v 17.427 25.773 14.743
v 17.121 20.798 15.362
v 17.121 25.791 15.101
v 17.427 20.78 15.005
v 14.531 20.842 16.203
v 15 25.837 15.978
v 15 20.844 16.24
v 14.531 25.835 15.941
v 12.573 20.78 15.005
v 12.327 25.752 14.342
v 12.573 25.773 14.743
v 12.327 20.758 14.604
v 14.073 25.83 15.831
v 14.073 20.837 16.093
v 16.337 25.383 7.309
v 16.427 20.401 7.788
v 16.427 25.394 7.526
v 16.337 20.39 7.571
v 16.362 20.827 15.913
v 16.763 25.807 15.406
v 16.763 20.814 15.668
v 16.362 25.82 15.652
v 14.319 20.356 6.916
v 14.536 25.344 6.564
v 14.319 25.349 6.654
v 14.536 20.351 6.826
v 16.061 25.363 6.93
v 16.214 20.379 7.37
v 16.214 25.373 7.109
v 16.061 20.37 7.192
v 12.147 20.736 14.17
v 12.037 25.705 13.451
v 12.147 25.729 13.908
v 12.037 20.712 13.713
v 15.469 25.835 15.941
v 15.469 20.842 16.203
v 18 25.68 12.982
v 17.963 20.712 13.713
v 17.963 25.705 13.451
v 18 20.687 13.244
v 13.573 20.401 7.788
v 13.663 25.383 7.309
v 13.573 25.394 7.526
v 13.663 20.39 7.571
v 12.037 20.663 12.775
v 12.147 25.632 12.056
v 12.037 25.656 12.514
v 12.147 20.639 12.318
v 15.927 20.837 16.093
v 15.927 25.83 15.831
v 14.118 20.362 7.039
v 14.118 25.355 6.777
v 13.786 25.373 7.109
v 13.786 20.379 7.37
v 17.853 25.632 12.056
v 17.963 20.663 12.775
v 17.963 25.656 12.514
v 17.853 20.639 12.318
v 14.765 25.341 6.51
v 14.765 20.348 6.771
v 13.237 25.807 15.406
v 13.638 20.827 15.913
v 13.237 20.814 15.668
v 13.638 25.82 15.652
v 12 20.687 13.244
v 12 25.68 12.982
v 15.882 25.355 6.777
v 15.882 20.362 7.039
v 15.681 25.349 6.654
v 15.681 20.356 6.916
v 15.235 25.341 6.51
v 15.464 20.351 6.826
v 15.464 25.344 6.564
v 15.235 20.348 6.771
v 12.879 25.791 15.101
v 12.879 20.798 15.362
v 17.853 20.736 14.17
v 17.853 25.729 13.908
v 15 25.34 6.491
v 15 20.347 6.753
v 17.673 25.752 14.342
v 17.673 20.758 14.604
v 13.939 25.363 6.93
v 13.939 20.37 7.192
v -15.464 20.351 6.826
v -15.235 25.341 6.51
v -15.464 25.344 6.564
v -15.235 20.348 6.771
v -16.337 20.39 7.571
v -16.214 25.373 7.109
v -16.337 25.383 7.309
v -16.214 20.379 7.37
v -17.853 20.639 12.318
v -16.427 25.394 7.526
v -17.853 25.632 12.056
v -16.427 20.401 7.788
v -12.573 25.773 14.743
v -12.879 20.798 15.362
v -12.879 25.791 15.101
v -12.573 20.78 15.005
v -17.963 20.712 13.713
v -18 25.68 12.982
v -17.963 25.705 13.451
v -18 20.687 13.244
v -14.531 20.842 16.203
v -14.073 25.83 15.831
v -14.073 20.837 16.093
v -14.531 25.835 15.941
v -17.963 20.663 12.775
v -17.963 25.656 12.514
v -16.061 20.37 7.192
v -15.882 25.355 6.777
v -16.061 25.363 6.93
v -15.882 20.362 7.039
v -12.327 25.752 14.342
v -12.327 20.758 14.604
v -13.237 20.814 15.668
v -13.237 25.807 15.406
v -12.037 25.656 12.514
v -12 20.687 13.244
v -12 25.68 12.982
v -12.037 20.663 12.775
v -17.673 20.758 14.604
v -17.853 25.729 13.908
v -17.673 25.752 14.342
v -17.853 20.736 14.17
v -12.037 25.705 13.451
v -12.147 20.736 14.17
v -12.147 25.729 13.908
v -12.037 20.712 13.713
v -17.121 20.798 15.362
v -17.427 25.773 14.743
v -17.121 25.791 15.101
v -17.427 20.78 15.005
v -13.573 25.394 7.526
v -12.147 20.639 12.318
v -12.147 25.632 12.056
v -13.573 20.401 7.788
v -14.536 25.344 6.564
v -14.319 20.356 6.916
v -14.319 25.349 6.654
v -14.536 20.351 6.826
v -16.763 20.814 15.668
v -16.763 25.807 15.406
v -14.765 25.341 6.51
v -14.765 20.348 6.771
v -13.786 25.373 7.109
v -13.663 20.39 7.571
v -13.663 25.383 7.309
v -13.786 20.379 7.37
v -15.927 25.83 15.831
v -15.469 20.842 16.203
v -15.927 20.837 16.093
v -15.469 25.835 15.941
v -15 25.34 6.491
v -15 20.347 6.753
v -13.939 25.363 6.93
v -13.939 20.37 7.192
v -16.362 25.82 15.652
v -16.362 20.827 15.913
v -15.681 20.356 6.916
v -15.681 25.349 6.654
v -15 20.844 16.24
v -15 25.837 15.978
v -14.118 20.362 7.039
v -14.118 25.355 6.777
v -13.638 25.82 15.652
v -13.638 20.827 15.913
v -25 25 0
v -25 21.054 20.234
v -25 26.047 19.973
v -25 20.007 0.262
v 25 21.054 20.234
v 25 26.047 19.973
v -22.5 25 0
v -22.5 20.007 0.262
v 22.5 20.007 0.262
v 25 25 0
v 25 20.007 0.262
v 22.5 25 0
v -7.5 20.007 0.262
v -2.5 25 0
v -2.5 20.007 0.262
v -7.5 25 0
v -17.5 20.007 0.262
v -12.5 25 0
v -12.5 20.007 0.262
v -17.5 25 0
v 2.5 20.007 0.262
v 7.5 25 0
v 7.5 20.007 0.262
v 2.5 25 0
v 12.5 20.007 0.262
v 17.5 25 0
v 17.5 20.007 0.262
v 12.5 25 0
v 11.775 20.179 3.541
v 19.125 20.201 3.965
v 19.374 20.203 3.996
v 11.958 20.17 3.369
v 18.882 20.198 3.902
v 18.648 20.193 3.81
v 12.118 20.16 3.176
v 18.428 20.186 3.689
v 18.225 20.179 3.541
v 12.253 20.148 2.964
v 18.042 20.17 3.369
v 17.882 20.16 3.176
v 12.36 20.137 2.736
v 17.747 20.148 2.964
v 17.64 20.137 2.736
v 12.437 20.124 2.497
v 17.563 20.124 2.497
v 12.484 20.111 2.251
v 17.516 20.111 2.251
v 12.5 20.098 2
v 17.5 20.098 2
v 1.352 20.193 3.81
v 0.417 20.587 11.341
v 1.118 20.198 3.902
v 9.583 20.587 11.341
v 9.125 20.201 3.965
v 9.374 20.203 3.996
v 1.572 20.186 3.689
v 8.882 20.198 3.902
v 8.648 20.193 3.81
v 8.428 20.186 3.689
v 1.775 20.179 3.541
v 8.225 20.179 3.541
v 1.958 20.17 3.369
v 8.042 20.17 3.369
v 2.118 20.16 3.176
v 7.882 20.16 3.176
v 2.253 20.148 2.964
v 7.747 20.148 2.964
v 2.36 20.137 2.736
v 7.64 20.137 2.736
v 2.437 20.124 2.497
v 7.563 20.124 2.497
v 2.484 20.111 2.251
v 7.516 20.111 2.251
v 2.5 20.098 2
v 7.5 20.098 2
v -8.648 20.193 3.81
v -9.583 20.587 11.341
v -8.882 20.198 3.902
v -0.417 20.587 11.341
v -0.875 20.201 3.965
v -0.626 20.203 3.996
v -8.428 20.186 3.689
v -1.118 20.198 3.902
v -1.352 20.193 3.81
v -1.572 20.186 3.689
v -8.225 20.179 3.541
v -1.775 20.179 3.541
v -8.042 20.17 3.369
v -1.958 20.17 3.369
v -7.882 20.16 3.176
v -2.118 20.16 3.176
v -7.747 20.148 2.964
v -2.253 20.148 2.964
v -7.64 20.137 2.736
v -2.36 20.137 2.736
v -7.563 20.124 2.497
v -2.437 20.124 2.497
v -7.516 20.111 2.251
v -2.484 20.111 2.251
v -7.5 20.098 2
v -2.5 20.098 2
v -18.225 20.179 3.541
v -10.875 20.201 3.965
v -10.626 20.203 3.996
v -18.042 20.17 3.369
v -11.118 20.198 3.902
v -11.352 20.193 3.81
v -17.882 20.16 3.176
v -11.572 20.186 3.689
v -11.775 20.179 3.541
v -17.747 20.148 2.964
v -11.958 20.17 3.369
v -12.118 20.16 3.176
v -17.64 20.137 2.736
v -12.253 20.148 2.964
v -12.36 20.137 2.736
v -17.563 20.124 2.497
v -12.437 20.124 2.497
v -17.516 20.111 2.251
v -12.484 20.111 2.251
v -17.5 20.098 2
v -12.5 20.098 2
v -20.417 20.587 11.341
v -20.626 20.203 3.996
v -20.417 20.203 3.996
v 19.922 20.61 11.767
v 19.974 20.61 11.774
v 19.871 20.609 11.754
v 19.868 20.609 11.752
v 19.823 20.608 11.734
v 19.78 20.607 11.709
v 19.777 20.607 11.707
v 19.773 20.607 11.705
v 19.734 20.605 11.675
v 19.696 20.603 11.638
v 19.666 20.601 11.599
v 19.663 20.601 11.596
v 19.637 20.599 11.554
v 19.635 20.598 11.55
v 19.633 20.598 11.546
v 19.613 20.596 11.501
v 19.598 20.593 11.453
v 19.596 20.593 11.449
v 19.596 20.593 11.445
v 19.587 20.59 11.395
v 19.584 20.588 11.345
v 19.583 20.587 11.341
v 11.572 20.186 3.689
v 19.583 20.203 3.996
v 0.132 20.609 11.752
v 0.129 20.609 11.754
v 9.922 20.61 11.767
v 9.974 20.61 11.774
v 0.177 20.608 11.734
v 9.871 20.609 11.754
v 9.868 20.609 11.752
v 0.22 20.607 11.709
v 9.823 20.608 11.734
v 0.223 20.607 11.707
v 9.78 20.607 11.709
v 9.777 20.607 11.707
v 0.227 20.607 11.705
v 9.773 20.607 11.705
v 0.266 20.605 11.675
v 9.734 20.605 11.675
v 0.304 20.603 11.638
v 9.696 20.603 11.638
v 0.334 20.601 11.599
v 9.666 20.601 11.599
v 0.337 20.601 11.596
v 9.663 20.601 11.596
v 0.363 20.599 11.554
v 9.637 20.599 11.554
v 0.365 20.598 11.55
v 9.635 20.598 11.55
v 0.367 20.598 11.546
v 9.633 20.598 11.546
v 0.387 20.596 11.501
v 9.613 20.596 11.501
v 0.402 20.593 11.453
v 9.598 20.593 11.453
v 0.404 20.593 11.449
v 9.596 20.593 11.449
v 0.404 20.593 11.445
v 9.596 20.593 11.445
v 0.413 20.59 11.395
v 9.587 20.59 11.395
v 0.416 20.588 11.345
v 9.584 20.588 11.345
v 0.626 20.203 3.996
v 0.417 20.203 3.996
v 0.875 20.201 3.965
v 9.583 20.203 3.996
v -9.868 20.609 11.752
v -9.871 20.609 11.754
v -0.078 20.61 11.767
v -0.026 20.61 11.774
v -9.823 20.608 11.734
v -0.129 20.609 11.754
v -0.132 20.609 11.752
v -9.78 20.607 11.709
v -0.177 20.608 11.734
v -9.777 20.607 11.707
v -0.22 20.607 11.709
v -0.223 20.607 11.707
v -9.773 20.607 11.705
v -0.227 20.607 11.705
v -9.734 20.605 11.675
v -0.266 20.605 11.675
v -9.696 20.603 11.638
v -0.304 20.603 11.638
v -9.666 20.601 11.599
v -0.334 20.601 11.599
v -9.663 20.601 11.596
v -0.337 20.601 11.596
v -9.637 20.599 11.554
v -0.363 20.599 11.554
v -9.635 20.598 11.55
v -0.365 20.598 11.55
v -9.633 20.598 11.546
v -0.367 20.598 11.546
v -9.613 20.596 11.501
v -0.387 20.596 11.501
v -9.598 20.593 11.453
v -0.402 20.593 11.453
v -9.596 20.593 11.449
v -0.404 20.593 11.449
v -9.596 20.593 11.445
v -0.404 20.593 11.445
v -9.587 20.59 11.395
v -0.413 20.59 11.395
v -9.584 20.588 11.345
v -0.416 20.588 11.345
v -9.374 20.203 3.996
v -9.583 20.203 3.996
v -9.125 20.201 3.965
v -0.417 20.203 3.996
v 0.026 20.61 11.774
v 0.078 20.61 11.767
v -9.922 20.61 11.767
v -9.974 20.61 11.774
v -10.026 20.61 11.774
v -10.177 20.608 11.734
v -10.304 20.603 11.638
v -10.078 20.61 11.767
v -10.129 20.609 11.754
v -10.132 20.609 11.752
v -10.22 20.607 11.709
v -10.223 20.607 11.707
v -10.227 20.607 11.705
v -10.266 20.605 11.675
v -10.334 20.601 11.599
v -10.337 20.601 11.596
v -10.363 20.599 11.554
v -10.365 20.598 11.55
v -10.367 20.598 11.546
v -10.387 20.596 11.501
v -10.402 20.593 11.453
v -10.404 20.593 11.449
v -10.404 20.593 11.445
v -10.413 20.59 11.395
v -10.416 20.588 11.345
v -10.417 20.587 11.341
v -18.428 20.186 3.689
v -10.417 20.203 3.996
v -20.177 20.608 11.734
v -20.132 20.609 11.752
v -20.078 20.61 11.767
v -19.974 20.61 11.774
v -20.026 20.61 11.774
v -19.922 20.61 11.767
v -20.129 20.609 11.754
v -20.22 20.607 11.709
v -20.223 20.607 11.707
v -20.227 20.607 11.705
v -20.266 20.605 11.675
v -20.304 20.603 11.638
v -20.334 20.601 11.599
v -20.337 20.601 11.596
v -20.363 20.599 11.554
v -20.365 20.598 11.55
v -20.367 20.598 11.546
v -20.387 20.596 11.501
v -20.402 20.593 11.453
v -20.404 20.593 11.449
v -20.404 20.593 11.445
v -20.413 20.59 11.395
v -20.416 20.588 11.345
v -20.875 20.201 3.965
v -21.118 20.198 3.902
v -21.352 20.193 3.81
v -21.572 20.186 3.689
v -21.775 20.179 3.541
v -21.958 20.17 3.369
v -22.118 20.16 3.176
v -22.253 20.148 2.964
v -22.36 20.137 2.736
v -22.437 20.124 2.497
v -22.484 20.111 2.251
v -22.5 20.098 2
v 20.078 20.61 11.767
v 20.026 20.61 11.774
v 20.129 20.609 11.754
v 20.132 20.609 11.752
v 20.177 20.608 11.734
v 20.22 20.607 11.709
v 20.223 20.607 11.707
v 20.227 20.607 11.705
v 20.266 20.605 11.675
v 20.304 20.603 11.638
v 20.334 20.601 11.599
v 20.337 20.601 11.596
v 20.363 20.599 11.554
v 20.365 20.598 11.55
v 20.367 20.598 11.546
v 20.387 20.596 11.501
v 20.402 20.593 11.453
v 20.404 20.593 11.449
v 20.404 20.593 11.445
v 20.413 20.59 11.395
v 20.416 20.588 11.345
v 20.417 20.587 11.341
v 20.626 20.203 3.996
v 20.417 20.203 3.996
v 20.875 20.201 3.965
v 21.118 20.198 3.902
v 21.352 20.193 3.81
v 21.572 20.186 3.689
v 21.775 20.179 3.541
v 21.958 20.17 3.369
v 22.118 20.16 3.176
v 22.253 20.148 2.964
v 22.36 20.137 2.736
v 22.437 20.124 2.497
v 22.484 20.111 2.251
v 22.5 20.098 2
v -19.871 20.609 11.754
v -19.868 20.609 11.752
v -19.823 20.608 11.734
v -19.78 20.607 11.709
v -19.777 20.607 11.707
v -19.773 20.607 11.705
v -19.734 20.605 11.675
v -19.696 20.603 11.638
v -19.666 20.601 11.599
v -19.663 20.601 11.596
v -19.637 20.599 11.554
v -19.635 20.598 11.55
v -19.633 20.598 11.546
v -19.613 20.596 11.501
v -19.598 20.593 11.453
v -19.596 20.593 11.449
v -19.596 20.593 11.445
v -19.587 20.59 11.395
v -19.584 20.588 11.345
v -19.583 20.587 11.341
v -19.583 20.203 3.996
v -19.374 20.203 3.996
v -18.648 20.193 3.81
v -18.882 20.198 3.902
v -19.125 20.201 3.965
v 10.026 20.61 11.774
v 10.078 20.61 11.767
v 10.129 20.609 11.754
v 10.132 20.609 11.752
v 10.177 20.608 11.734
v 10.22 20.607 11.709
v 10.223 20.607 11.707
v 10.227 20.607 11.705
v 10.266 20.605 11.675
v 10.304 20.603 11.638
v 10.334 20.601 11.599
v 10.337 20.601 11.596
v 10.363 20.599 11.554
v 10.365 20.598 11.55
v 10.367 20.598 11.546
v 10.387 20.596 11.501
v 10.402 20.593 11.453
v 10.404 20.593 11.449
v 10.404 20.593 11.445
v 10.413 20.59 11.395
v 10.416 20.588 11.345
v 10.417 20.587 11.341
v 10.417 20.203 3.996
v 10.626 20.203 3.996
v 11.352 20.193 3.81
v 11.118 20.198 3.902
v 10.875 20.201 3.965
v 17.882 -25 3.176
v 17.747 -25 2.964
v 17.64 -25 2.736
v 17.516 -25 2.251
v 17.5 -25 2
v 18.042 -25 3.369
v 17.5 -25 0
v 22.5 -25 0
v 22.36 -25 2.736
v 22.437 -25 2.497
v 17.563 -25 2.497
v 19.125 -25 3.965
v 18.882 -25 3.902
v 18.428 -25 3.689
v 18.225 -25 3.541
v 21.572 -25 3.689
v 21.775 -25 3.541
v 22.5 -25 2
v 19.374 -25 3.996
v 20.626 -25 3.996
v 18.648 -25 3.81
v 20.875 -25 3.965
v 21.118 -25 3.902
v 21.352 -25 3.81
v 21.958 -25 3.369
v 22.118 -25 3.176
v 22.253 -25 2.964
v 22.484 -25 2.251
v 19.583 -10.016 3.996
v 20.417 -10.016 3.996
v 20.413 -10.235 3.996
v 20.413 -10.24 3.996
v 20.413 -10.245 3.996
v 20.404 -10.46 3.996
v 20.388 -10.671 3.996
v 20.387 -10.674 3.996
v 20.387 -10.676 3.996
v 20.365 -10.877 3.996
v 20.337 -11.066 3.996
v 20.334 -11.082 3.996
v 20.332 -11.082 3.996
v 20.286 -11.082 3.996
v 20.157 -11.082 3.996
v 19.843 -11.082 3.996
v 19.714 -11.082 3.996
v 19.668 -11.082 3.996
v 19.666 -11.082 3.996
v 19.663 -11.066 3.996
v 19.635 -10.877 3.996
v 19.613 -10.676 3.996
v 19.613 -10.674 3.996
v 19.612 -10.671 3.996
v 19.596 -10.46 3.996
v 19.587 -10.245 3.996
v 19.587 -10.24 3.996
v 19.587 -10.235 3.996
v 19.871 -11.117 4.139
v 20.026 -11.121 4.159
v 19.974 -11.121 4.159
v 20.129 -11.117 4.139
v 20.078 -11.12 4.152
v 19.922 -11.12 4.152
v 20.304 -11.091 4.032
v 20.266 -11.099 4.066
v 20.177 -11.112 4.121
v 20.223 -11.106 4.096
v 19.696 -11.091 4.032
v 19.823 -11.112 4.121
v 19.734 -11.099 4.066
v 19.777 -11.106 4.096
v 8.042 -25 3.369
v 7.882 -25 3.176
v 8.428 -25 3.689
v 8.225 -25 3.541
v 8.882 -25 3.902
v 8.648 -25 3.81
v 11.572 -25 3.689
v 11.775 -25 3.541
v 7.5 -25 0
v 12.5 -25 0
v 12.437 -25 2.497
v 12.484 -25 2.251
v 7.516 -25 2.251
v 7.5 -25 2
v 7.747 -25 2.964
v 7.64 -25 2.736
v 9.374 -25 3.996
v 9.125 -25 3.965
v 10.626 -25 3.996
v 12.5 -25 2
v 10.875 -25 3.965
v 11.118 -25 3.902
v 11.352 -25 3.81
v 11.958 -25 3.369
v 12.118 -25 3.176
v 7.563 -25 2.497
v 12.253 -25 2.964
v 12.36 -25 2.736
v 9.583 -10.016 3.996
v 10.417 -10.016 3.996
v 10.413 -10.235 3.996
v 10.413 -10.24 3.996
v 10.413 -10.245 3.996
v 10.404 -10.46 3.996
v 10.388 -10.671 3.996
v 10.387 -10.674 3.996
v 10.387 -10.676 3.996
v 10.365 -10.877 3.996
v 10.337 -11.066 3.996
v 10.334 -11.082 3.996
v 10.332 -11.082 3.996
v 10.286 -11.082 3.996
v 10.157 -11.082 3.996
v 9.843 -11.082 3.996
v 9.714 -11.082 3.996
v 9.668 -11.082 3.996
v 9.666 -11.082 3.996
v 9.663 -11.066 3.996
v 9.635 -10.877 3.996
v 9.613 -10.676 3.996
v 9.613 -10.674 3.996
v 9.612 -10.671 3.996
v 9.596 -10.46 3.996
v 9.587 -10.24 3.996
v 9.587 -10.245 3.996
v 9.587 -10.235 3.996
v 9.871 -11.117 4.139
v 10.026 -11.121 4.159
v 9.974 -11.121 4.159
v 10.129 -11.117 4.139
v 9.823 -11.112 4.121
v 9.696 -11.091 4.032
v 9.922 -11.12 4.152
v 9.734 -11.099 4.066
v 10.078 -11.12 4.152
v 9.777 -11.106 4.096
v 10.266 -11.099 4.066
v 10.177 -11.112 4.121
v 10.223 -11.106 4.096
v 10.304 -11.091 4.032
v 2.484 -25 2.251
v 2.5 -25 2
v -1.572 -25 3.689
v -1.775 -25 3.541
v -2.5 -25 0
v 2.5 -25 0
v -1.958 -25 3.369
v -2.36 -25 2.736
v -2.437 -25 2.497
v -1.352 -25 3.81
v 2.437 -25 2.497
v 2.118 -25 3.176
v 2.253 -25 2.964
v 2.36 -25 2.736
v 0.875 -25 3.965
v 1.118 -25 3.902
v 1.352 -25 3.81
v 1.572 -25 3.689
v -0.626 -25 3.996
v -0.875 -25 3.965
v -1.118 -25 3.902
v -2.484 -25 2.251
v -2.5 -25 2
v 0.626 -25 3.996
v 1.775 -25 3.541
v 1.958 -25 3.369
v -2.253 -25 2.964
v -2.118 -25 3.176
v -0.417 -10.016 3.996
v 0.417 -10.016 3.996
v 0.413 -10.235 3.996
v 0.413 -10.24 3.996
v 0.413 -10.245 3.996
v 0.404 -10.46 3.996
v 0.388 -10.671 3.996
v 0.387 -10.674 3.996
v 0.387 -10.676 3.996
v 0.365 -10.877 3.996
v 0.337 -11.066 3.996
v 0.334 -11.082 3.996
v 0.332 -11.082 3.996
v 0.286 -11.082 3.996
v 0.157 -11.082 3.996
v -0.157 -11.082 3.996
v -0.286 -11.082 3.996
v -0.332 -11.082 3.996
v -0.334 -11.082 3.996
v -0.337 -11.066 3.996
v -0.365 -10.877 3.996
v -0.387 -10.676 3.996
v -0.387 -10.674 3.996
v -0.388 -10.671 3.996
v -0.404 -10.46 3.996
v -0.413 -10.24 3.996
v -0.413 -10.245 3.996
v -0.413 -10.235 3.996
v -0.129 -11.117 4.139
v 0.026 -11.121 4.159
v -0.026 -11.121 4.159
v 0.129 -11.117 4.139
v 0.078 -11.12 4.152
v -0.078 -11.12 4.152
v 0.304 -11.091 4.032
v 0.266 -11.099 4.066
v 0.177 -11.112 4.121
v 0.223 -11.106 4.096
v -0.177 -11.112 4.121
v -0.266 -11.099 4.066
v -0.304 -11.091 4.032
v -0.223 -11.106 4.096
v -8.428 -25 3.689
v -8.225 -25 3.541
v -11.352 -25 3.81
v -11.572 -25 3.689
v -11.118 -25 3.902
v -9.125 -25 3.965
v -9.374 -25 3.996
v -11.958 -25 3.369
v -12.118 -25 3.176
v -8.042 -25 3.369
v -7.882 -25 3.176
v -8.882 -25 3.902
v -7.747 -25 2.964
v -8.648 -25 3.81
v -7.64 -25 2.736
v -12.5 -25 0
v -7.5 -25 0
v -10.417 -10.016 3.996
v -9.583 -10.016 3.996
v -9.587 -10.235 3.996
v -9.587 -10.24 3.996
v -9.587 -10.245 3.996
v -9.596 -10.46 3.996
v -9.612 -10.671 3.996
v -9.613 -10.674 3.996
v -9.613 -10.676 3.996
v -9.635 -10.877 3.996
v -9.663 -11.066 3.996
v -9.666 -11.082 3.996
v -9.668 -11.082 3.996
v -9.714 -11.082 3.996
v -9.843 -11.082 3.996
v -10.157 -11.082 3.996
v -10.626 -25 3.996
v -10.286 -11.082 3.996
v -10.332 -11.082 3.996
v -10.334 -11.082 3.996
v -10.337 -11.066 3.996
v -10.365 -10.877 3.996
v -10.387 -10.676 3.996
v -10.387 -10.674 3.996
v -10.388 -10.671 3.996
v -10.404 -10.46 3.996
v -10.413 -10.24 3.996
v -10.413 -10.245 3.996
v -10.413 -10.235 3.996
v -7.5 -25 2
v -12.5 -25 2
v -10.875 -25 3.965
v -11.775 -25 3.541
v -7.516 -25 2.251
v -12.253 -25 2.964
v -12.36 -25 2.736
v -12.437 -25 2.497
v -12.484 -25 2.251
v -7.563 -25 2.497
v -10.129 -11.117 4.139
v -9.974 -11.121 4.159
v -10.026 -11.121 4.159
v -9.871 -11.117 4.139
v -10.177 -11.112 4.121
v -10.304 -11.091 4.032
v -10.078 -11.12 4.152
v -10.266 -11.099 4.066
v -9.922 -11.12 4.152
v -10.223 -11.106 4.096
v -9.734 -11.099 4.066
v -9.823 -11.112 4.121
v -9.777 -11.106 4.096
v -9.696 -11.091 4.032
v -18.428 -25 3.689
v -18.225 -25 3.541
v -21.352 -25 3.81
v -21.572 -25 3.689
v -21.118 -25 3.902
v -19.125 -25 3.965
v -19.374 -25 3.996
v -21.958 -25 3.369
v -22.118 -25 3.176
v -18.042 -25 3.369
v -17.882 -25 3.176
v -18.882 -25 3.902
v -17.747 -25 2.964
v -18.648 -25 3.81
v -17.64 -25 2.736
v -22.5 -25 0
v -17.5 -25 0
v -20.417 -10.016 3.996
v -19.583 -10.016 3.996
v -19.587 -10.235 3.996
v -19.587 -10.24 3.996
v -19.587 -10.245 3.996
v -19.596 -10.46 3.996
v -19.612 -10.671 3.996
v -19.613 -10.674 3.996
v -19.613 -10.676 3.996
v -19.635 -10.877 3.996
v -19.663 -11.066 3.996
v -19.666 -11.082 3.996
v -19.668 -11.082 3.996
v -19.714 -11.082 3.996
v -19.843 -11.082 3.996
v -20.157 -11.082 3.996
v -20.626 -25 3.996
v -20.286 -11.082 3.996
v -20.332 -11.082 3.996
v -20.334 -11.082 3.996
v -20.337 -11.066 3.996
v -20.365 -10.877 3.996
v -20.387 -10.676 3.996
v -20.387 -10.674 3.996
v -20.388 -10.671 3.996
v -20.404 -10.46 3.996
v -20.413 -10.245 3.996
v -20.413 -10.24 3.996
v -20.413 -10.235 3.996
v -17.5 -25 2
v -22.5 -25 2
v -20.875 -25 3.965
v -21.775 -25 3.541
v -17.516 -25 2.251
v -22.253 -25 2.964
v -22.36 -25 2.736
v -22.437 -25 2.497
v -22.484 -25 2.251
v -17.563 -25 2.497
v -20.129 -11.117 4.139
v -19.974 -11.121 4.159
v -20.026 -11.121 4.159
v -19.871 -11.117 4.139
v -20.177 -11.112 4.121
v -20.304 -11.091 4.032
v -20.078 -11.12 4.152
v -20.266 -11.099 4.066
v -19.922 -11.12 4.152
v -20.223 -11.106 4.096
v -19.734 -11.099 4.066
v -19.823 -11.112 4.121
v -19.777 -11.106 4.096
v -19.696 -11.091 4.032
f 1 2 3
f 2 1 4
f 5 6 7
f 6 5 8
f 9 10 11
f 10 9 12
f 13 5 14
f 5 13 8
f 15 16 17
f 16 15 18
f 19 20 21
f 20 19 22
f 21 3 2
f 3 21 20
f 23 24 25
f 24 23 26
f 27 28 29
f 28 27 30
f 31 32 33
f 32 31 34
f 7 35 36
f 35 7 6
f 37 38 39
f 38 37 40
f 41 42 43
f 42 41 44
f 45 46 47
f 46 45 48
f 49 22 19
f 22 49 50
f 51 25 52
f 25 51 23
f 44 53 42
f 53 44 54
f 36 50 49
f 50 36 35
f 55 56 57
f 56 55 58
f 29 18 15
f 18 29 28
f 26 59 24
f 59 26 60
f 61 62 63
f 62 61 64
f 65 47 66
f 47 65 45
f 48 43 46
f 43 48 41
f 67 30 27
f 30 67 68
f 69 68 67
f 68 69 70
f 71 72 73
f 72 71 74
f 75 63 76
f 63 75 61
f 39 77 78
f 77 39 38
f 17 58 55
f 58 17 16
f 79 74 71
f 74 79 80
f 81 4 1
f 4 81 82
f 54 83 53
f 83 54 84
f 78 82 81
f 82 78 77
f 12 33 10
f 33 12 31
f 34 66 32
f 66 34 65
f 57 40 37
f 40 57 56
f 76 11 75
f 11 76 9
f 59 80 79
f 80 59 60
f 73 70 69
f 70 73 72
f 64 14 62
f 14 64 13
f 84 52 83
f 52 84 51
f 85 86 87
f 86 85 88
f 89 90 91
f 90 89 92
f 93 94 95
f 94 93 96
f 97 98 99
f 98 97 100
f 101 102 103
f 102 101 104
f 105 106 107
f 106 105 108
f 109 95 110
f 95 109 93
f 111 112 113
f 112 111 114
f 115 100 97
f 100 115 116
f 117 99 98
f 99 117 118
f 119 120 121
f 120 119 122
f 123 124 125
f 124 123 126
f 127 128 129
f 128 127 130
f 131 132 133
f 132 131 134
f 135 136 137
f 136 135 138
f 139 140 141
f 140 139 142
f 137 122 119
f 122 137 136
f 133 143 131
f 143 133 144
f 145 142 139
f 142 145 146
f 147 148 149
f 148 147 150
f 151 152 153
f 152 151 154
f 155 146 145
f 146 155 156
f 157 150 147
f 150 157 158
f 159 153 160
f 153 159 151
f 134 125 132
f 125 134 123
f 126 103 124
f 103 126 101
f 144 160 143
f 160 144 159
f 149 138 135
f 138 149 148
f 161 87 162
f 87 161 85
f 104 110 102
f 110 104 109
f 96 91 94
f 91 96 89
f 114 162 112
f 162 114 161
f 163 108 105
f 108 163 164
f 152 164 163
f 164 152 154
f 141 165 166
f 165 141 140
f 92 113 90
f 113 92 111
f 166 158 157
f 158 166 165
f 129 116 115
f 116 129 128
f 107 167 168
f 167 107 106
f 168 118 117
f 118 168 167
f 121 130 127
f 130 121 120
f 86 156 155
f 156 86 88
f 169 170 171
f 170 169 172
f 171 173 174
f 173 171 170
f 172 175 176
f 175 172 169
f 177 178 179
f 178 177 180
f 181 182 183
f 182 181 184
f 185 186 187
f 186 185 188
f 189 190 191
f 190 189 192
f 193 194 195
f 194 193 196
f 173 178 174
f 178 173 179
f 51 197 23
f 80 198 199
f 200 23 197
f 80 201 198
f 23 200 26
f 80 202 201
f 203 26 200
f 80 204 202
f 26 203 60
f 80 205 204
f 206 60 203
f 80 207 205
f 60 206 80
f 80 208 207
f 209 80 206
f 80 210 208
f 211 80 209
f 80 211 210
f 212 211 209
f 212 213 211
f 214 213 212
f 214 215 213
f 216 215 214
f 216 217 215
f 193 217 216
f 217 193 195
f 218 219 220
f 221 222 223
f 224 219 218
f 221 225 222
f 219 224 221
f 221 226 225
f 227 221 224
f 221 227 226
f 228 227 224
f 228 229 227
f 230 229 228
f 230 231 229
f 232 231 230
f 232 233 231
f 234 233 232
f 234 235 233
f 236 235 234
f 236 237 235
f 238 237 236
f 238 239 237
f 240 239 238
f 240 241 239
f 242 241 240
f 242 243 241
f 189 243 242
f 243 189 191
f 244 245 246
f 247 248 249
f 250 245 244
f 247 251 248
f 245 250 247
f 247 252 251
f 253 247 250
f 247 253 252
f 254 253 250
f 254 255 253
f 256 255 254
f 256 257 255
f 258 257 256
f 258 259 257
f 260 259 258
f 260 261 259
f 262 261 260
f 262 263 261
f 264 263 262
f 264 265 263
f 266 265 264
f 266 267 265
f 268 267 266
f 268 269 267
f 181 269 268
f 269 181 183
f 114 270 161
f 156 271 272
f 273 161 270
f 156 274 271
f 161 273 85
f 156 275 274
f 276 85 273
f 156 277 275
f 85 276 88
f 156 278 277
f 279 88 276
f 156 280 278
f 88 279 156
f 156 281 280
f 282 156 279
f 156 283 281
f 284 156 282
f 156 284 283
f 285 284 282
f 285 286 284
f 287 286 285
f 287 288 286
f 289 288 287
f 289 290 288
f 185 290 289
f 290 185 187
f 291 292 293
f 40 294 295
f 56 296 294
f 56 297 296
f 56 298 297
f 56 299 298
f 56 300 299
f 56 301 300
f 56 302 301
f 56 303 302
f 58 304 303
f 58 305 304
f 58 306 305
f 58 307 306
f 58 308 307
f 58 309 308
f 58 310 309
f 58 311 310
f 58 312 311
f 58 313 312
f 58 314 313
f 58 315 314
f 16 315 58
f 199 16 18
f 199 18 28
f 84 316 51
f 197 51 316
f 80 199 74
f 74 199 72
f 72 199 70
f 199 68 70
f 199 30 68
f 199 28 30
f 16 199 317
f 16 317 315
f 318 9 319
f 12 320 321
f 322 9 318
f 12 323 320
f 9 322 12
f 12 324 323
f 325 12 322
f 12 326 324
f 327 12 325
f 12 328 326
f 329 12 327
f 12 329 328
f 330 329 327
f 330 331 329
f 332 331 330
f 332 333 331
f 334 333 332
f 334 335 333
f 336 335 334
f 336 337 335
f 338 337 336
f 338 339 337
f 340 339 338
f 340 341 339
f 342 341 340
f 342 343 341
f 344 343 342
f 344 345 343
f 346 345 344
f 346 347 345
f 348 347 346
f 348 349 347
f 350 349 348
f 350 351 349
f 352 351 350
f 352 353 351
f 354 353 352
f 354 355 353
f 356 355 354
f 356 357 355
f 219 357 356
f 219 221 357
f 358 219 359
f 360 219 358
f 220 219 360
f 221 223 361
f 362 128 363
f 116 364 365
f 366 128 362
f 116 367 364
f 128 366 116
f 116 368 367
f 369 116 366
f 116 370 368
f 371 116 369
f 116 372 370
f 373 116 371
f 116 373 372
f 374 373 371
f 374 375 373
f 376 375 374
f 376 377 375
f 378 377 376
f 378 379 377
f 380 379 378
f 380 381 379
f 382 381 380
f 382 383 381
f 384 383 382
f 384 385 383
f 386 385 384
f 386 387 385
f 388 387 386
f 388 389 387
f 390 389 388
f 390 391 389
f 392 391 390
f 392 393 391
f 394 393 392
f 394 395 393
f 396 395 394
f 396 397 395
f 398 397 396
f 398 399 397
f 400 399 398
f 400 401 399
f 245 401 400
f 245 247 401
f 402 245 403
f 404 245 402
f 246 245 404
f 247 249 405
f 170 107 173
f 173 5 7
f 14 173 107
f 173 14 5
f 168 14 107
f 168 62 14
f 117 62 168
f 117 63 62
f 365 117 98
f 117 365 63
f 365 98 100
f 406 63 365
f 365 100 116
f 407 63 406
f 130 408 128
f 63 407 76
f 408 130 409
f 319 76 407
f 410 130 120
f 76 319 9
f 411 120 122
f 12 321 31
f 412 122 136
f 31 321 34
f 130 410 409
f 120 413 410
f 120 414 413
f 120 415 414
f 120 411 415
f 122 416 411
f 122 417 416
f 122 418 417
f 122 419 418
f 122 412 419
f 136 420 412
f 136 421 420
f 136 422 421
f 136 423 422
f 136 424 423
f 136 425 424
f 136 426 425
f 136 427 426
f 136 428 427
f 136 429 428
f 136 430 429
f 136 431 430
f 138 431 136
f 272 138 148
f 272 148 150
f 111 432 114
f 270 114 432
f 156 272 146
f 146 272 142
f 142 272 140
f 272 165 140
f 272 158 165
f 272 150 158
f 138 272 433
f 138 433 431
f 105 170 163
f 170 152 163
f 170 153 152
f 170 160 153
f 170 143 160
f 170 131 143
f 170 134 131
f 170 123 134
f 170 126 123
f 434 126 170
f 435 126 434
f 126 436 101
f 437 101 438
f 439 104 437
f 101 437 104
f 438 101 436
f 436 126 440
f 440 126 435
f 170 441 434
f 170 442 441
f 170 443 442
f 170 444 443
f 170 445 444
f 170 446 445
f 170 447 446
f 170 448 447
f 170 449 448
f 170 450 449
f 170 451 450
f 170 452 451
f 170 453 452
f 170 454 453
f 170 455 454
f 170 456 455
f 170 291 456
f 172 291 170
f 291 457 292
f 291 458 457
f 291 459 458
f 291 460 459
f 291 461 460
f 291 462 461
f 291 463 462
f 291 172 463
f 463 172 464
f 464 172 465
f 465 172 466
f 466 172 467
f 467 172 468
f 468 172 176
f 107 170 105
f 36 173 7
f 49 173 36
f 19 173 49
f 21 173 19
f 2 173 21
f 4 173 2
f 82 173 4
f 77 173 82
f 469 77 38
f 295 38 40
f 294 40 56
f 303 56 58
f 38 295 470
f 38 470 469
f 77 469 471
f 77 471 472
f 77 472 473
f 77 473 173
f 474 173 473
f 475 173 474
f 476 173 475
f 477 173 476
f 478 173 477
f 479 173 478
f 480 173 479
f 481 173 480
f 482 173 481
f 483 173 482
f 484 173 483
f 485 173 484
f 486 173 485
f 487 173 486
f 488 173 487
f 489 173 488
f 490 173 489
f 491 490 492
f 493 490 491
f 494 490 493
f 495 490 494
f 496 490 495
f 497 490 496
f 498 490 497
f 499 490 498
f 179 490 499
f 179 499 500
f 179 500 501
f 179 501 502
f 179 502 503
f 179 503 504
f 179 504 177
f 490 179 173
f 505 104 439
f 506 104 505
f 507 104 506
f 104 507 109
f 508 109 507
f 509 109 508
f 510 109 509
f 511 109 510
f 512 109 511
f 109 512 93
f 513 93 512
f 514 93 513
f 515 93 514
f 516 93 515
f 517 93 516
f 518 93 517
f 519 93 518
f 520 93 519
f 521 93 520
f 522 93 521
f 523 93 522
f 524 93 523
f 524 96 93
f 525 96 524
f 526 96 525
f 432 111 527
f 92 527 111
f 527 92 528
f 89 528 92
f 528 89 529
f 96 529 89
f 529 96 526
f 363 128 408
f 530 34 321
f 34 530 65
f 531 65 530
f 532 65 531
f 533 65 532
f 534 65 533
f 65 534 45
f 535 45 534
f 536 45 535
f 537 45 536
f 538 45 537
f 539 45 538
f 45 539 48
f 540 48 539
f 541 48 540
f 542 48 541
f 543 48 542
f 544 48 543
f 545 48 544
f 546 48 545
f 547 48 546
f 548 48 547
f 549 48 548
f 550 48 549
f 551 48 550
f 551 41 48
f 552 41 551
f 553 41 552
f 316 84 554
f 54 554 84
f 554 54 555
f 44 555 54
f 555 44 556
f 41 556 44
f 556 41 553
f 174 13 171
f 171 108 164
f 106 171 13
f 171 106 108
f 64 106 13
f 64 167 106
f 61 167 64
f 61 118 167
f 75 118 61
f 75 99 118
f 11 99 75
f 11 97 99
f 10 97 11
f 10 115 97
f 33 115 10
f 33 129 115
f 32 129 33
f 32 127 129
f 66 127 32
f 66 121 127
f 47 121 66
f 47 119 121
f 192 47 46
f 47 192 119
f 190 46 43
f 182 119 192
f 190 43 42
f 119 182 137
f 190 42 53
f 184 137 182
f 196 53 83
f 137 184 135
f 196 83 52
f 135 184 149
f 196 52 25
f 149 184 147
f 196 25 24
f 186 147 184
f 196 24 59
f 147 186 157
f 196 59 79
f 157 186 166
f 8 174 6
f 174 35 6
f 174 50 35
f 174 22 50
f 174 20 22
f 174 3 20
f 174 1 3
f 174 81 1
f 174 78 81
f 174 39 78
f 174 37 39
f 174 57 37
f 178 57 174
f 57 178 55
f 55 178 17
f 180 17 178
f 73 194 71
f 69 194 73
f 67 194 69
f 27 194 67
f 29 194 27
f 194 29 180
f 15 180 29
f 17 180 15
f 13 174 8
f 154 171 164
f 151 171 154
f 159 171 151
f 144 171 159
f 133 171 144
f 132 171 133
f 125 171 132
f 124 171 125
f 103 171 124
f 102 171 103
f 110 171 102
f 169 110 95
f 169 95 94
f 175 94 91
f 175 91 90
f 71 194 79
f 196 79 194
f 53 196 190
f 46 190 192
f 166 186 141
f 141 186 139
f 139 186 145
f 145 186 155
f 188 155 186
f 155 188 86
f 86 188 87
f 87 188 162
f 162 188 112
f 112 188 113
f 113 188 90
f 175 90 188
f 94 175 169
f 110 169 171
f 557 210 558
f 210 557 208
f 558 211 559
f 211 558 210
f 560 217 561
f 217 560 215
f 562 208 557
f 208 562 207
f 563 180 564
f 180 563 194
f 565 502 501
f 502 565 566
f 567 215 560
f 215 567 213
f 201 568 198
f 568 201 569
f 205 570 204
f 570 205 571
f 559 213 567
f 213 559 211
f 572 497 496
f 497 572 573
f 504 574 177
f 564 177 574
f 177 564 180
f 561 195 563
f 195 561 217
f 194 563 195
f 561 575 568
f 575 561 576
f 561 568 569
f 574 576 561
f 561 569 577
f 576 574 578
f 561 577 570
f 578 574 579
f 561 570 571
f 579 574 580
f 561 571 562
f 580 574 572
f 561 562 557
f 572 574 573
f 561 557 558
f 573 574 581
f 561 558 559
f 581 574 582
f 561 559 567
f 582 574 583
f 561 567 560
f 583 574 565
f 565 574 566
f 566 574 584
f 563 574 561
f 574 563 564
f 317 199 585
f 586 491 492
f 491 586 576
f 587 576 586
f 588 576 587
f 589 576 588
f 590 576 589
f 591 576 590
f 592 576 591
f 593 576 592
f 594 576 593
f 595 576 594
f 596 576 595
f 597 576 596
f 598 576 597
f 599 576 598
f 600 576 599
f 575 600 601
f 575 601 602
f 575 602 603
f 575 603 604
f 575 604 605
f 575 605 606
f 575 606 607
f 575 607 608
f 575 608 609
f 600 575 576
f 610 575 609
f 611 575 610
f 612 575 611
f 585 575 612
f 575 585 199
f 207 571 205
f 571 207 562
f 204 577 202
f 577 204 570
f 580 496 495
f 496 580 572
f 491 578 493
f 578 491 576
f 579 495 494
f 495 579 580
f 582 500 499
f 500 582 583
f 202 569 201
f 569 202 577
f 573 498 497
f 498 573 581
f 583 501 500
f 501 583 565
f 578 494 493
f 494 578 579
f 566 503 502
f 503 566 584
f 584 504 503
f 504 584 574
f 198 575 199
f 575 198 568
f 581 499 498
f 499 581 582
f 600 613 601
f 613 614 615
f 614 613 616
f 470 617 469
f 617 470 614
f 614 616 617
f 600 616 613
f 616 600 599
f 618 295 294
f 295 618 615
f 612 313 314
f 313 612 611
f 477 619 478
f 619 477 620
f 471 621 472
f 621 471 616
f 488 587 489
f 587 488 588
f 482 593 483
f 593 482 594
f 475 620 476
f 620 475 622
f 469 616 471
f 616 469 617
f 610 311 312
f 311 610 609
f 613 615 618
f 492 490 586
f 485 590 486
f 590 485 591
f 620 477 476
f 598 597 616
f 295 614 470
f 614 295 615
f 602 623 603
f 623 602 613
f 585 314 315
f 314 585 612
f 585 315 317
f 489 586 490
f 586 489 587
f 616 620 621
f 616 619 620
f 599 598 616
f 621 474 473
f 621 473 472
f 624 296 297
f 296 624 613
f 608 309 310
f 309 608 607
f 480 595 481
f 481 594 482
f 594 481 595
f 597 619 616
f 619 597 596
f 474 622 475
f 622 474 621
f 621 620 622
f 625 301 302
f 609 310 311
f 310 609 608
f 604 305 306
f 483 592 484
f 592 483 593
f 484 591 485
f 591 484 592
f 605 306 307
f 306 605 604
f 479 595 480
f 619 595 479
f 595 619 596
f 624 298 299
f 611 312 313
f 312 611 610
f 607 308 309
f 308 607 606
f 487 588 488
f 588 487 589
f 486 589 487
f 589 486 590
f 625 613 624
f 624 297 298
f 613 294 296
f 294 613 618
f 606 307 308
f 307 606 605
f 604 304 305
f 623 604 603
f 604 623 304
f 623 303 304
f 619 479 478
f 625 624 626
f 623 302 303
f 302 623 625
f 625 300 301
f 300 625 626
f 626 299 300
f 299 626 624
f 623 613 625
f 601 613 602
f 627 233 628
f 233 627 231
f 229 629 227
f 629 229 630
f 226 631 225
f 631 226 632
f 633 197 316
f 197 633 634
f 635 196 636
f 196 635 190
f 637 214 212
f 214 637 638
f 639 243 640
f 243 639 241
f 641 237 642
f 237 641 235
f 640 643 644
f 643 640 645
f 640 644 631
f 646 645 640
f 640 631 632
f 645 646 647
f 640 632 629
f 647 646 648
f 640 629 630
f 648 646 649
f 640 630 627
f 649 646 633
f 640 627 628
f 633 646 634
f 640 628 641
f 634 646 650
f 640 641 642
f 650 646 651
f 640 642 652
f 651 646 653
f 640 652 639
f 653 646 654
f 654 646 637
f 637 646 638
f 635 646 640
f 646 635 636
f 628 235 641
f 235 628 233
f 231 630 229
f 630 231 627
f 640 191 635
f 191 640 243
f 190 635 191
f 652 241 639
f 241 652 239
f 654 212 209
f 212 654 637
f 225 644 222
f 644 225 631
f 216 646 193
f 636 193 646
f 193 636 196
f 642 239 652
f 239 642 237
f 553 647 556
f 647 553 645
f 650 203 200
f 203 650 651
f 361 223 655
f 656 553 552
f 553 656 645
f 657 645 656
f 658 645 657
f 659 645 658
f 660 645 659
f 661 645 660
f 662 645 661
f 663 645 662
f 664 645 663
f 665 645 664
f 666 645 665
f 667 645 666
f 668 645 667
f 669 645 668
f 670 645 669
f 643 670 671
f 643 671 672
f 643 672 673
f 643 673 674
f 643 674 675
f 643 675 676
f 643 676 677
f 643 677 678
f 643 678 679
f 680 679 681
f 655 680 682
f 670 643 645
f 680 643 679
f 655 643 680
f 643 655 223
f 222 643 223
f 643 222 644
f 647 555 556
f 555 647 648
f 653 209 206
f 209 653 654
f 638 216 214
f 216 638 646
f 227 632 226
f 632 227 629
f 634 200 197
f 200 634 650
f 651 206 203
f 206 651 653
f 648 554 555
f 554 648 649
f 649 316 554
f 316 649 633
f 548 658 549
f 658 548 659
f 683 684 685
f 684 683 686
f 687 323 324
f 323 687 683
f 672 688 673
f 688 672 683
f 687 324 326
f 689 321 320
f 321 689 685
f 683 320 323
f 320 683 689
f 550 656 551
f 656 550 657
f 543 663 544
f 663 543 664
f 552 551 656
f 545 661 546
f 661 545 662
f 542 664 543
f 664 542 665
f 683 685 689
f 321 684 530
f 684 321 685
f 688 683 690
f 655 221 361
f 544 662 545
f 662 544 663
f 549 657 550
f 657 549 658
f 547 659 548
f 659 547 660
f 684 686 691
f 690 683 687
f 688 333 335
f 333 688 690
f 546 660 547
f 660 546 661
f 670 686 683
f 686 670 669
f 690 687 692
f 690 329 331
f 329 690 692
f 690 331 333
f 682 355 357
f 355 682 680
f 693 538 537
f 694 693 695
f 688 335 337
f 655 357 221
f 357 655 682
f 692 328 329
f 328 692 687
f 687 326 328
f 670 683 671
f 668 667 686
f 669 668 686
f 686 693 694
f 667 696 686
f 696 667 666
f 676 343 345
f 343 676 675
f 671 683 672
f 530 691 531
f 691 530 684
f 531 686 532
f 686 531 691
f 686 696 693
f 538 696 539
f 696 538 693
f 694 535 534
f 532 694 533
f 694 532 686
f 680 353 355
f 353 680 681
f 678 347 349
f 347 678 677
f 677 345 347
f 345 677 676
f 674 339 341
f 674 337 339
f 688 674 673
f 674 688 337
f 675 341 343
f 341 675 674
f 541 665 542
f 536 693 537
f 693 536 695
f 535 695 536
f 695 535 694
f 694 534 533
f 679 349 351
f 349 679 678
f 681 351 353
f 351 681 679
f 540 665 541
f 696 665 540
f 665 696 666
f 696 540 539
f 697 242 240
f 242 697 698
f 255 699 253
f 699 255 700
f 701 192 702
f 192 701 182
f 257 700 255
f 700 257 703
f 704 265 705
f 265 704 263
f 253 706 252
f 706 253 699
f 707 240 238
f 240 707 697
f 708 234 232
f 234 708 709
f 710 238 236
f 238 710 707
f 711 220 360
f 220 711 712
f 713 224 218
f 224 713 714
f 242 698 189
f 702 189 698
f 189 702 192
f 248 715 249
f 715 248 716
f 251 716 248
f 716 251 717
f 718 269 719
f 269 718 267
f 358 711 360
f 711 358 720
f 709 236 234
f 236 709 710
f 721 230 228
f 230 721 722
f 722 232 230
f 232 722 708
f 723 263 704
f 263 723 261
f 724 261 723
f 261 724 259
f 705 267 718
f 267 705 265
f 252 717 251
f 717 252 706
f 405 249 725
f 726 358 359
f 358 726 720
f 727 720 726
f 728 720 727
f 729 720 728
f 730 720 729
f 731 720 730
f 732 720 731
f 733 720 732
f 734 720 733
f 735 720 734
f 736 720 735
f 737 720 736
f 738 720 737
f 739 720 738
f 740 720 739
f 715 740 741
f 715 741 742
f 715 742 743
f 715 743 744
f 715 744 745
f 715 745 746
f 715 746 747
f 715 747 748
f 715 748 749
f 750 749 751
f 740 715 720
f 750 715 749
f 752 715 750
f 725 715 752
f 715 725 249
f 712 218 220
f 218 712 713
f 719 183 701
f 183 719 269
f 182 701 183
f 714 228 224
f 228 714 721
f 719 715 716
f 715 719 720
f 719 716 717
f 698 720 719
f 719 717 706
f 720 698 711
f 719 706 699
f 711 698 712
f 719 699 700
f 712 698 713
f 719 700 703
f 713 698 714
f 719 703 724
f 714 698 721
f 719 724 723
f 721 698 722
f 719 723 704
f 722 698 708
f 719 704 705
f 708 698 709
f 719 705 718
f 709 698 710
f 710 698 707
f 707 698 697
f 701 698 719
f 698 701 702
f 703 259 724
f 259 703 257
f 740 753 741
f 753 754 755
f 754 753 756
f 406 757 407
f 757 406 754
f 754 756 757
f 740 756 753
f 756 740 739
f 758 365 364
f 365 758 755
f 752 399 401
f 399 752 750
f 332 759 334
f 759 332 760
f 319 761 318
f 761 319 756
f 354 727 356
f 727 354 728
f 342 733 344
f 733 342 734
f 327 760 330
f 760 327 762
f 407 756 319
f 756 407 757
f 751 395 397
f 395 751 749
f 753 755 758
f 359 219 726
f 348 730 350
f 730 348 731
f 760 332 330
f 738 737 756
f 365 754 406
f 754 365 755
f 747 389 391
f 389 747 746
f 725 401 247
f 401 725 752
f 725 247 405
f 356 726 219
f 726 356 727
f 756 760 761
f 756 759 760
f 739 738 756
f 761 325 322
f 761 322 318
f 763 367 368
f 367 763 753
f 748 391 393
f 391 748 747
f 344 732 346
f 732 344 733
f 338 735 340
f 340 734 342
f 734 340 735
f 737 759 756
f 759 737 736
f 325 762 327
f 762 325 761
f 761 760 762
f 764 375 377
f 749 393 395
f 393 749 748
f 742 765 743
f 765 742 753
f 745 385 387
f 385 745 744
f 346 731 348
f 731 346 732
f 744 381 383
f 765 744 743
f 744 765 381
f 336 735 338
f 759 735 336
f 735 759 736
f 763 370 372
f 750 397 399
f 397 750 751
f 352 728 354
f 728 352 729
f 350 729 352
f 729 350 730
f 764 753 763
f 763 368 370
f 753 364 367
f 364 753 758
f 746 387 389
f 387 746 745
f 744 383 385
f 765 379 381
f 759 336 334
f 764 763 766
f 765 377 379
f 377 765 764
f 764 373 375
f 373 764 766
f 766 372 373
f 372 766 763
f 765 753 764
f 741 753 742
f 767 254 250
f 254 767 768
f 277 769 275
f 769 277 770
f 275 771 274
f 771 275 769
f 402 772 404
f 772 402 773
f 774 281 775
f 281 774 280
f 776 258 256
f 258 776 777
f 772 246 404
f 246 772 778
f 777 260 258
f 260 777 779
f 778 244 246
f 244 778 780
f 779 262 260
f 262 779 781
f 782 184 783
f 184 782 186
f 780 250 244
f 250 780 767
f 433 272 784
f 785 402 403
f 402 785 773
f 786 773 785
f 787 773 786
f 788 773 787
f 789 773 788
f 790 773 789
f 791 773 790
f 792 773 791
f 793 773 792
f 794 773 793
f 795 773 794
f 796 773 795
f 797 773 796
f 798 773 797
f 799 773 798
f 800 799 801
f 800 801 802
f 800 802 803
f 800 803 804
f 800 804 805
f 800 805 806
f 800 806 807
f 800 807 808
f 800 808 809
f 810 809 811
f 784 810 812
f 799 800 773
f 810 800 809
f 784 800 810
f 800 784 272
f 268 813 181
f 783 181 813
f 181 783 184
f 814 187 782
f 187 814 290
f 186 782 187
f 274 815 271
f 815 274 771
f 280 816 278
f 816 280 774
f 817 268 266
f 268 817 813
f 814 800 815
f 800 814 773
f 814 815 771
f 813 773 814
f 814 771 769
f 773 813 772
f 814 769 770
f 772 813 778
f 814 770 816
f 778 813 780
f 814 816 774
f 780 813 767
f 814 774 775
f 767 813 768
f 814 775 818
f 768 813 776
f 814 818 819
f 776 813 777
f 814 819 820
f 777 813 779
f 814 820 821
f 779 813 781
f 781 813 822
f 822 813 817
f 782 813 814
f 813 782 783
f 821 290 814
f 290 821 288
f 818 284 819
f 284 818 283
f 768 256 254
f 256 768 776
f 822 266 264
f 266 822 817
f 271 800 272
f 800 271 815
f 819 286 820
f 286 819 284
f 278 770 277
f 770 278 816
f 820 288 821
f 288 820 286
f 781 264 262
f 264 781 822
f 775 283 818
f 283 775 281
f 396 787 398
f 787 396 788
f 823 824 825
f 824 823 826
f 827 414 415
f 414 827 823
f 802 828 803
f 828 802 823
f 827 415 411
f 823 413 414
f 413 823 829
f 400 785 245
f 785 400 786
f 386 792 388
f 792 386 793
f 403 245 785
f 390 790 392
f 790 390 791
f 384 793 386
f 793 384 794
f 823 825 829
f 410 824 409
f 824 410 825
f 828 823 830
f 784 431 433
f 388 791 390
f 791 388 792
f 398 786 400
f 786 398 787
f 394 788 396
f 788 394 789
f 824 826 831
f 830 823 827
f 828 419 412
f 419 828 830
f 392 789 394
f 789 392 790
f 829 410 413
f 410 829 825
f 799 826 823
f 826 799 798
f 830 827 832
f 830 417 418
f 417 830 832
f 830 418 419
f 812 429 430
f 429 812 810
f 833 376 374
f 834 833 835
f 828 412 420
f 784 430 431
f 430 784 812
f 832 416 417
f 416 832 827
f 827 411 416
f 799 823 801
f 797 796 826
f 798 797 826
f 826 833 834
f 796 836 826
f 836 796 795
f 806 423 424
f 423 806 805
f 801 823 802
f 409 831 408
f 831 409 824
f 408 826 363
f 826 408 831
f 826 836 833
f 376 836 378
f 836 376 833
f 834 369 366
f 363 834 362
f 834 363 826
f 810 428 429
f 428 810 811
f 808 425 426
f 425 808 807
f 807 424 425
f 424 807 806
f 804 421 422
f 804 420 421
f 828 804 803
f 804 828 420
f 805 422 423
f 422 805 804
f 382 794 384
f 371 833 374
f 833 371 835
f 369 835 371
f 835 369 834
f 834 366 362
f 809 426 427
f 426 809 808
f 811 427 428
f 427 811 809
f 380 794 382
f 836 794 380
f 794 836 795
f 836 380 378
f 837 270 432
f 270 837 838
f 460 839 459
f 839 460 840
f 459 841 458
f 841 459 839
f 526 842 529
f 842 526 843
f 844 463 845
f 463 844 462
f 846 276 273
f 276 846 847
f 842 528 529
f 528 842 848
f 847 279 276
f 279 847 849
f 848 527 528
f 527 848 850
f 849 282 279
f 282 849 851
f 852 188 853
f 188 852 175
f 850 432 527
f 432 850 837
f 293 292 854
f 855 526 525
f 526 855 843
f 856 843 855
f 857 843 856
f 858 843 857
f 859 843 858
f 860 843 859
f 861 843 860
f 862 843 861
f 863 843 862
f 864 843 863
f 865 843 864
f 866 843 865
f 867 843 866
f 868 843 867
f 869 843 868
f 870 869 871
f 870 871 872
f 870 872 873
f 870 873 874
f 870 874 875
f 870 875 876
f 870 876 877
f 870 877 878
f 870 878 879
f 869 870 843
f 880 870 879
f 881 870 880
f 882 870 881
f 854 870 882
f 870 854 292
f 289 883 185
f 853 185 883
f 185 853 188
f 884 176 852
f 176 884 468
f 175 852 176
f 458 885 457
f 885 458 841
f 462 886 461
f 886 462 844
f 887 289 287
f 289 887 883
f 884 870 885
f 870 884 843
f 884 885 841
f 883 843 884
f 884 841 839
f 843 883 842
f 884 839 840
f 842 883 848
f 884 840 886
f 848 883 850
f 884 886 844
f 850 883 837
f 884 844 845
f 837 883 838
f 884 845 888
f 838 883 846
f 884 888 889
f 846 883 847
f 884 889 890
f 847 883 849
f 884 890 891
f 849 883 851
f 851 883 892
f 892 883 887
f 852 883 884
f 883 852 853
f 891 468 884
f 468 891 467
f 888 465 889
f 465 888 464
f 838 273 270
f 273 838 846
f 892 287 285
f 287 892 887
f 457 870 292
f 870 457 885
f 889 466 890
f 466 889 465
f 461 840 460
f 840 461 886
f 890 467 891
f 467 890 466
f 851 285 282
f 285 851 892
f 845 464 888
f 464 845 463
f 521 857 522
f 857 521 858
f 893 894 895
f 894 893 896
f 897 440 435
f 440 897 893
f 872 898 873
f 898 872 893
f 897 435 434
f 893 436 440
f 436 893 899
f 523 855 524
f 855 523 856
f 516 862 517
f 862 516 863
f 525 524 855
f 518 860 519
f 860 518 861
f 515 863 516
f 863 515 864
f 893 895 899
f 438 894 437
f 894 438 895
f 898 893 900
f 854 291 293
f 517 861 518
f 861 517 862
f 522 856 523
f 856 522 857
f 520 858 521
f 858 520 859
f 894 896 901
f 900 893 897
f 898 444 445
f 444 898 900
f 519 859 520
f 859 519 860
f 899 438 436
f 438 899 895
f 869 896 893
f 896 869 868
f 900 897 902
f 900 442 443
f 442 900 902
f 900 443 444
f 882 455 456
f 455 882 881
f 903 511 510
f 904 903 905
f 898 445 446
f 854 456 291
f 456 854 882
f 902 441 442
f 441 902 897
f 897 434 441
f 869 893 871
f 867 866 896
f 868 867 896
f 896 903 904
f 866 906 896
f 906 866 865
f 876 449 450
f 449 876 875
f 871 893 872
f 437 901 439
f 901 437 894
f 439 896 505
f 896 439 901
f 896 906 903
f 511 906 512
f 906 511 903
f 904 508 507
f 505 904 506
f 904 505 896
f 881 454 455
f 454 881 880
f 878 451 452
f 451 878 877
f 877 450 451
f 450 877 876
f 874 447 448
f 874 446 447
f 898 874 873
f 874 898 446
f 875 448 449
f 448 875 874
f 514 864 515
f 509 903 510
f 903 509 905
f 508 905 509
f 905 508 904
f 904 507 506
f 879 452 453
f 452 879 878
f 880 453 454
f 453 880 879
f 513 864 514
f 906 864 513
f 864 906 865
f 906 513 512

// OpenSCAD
/******************************************************************************/
/**********                     INFO                                 **********/
/******************************************************************************/

/*
Wall Mount Test lead Hanger Rev 1.1 March 2016
you can adjust the number of fingers, length and gap.  
The wall mount piece will auto adjust total width to accommodate the above parameters
by David Buhler

1.1
-added hole size fix for small finger gaps and large wall mount hole size
-fixed minimum finger length support cylinder length
-adjusted variable settings for customizer so user input doesn't create wierd holes and gaps
-added side trimming to reduce size and plastic use.

*/

/******************************************************************************/
/**********                     Settings                             **********/
/******************************************************************************/
//adjust the follow to meet your needs,  all measurements in mm.

/* [BACK] */
//Height of wall mounting plate
back_height=20;//[12:50]

//Mounting plate thickness
back_thickness=5;//[3:10] 

/* [FINGERS] */
//Finger slope(degrees)
back_tilt=3;//[0:8]

//Number of fingers
numberof_fingers=5;//[3:15]

//Slot length
finger_length=50;//[20:100]

//determines weight holding ability
finger_thickness=4; //[2:7]

//how much room for the clips
finger_width=5; //[5:20]

//how wide the slot will be(cable thickness)
finger_gap=5;//[1:15]

/* [SCREW-HOLES] */
//add mounting holes?
mount_holes="yes";//[yes,no]

//thread size in mm
hole_size=3;//[1:6]

/* [FINGER SHAPE] */
//select one the the two following finger shapes
finger_shape="round";//[round,square]
//Trim the sides?
trim_sides= "no"; // [yes,no]


/* [BUILD PLATE] */
//for display only, doesn't contribute to final object
build_plate_selector = 3; //[0:Replicator 2,1: Replicator,2:Thingomatic,3:Manual]
//when Build Plate Selector is set to "manual" this controls the build plate x dimension
build_plate_manual_x = 200; //[100:400]
//when Build Plate Selector is set to "manual" this controls the build plate y dimension
build_plate_manual_y = 200; //[100:400]
build_plate(build_plate_selector,build_plate_manual_x,build_plate_manual_y);

/******************************************************************************/
/**********                   Variable Calcs                         **********/
/****placement of the finger support structure, no need to adjust these********/
/******************************************************************************/
/* [HIDDEN] */
s_width=finger_width/6; //Support triangle width  could just make a fixed width rather than based on finger width
s_height=back_height/2.5;//Support triangle height based on the back height
s_length=finger_length/3*2;//Support triangle lenght based on the finger length 
s_placement_x=(finger_width/2)-(s_width/2);//where to place the X starting point of the support 
s_placement_y=back_thickness/3; //where to place the Y starting point of the support, /3 to accommodate the back tilt 
s_placement_z=finger_thickness;//where to place the Z starting point of the support 


/******************************************************************************/
/**********                  Make It Happen Stuff                    **********/
/******************************************************************************/

echo ("Project Size (wide x height x finger length " ,numberof_fingers*(finger_width+finger_gap)," x ",back_height," x ",finger_length+back_thickness);

//centre the whole project on x0,y0
rotate ([0,0,180])translate ([-(numberof_fingers*(finger_width+finger_gap))/2,-finger_length/2,0])
    {
    difference()//had to stick three difference calls to trim sides.  weird!
        { 
       if (mount_holes=="yes")
            {
            rotate ([back_tilt,0,0]) 
                difference()
                {
                cube([(numberof_fingers*(finger_width+finger_gap)),back_thickness,back_height]);//make plate with auto width based on fingers+width+gap
                Holes ();
                };
            }
        else
            {
            rotate ([back_tilt,0,0]) 
                cube ([(numberof_fingers*(finger_width+finger_gap)),back_thickness,back_height]);//make plate with auto width based on fingers+width+gap
        }
    trim_sides();
    }
    for (inc=[finger_gap/2:finger_width+finger_gap:(numberof_fingers*(finger_width+finger_gap))-finger_gap]) //auto gen each finger and support placement distance
        {
        difference()//had to stick three difference calls to trim sides.  weird!
            {
        if (finger_shape=="round")
            {
            finger(inc,finger_thickness,finger_width,finger_length);//for rounded couner fingers
            }
        else if(finger_shape=="square")
            {
            translate ([inc,0,0])cube ([finger_width,finger_length,finger_thickness]);//for square fingers
            }
           trim_sides();
           }
         difference()//had to stick three difference calls to trim sides.  weird!
           {
           hull ()//created the support surface along with the rounded edge
            {
            difference ()
                {
                translate ([inc-s_width/2+finger_width/2,s_placement_y,s_placement_z])
                    cube ([s_width,s_length,s_height]);
                rotate ([-atan(s_height/s_length),0,0]) 
                    translate ([inc-.1-s_width+finger_width/2,0-back_thickness,s_height+finger_thickness-.2])
                    cube ([s_width*2,s_length*2,s_height*2]);  
                }
            translate ([inc+s_placement_x+s_width/2,s_placement_y,s_height+finger_thickness]) 
                rotate ([-atan(s_height/s_length)-90,0,0]) 
                cylinder(r=s_width/2,h=s_length+2,$fn=50); 
             }    
            trim_sides();
           }
        }
    }
    
//trims the side of the block to reduce size and unneeded support
module trim_sides()
    {
     if (trim_sides=="yes")
        {
        translate ([-finger_width/2,-5,-0.1]) 
            cube ([finger_width,finger_length+back_thickness+5,back_height+5]);
        translate ([((numberof_fingers)*(finger_width+finger_gap))-finger_gap-finger_width/2,-5,-0.1]) 
            cube ([finger_width,finger_length+back_thickness+5,back_height+5]);   
        }
     }
//creates the rounded fingers
module finger(position,thickness,width,length){
    hull(){
       rotate([-90,0,0])
            translate ([position+thickness/2,-thickness/2,0]) 
            cylinder (r=thickness/2,h=length,$fn=50);//left cylinder
       rotate([-90,0,0])
            translate ([position+width-thickness/2,-thickness/2,0]) 
            cylinder (r=thickness/2,h=length,$fn=50);//right cylinder 
       translate ([position,0,0])
            cube ([width,length,thickness/2]);//flat bottom (top when hanging)
    }
    
}
//creates the hole slots and placement based on number of fingers
module Holes ()
    {
    hole_size= hole_size*3 > back_height ? floor(back_height/5):hole_size; 
    hole_size= hole_size > finger_gap ? finger_gap:(hole_size==finger_gap ? hole_size-1:hole_size);
    if (numberof_fingers<7)
        {
        hull()
            { 
            rotate ([-90,0,0]) 
                translate([finger_width+(finger_gap/2) + finger_gap/2,(-back_height/5*2)-hole_size-2,-2]) 
                cylinder(r=hole_size,h=50,$fn=40);    
            rotate ([-90,0,0]) 
                translate([finger_width+(finger_gap/2) + finger_gap/2,-back_height/5*2,-2]) 
                cylinder(r=hole_size/2,h=50,$fn=40);   
            }
       hull()
            { 
            rotate ([-90,0,0]) 
                translate([((numberof_fingers-1)*(finger_width+finger_gap)),-back_height/5*2-hole_size-2,-2])        
                cylinder(r=hole_size,h=50,$fn=40);    
            rotate ([-90,0,0]) 
                translate([((numberof_fingers-1)*(finger_width+finger_gap)),-back_height/5*2,-2]) 
                cylinder(r=hole_size/2,h=50,$fn=40);   
            }
         } 
     else if (numberof_fingers>6)
        {
        hull()
            { 
            rotate ([-90,0,0]) 
                translate([(finger_width+finger_gap)*2-finger_gap/2,-back_height/5*2-hole_size-2,-2]) 
                cylinder(r=hole_size,h=50,$fn=40);    
            rotate ([-90,0,0]) 
                translate([(finger_width+finger_gap)*2-finger_gap/2,-back_height/5*2,-2]) 
                cylinder(r=hole_size/2,h=50,$fn=40);   
            }
       hull()
            { 
            rotate ([-90,0,0]) 
                translate([((numberof_fingers-2)*(finger_width+finger_gap))-finger_gap/2,-back_height/5*2-hole_size-2,-2])        
                cylinder(r=hole_size,h=50,$fn=40);    
            rotate ([-90,0,0]) 
                translate([((numberof_fingers-2)*(finger_width+finger_gap))-finger_gap/2,-back_height/5*2,-2]) 
                cylinder(r=hole_size/2,h=50,$fn=40);   
            }
         }    
     }
     
//display build plate on screen for reference 
module build_plate(bp,manX,manY){

		translate([0,0,-.52]){
			if(bp == 0){
				%cube([285,153,1],center = true);
			}
			if(bp == 1){
				%cube([225,145,1],center = true);
			}
			if(bp == 2){
				%cube([120,120,1],center = true);
			}
			if(bp == 3){
				%cube([manX,manY,1],center = true);
			}
		
		}
		translate([0,0,-.5]){
			if(bp == 0){
				for(i = [-14:14]){
					translate([i*10,0,0])
					%cube([.5,153,1.01],center = true);
				}
				for(i = [-7:7]){
					translate([0,i*10,0])
					%cube([285,.5,1.01],center = true);
				}	
			}
			if(bp == 1){
				for(i = [-11:11]){
					translate([i*10,0,0])
						%cube([.5,145,1.01],center = true);
				}
				for(i = [-7:7]){
					translate([0,i*10,0])
						%cube([225,.5,1.01],center = true);
				}
			}
			if(bp == 2){
				for(i = [-6:6]){
					translate([i*10,0,0])
						%cube([.5,120,1.01],center = true);
				}
				for(i = [-6:6]){
					translate([0,i*10,0])
						%cube([120,.5,1.01],center = true);
				}
			}
			if(bp == 3){
				for(i = [-(floor(manX/20)):floor(manX/20)]){
					translate([i*10,0,0])
						%cube([.5,manY,1.01],center = true);
				}
				for(i = [-(floor(manY/20)):floor(manY/20)]){
					translate([0,i*10,0])
						%cube([manX,.5,1.01],center = true);
				}
			}
		}
}
